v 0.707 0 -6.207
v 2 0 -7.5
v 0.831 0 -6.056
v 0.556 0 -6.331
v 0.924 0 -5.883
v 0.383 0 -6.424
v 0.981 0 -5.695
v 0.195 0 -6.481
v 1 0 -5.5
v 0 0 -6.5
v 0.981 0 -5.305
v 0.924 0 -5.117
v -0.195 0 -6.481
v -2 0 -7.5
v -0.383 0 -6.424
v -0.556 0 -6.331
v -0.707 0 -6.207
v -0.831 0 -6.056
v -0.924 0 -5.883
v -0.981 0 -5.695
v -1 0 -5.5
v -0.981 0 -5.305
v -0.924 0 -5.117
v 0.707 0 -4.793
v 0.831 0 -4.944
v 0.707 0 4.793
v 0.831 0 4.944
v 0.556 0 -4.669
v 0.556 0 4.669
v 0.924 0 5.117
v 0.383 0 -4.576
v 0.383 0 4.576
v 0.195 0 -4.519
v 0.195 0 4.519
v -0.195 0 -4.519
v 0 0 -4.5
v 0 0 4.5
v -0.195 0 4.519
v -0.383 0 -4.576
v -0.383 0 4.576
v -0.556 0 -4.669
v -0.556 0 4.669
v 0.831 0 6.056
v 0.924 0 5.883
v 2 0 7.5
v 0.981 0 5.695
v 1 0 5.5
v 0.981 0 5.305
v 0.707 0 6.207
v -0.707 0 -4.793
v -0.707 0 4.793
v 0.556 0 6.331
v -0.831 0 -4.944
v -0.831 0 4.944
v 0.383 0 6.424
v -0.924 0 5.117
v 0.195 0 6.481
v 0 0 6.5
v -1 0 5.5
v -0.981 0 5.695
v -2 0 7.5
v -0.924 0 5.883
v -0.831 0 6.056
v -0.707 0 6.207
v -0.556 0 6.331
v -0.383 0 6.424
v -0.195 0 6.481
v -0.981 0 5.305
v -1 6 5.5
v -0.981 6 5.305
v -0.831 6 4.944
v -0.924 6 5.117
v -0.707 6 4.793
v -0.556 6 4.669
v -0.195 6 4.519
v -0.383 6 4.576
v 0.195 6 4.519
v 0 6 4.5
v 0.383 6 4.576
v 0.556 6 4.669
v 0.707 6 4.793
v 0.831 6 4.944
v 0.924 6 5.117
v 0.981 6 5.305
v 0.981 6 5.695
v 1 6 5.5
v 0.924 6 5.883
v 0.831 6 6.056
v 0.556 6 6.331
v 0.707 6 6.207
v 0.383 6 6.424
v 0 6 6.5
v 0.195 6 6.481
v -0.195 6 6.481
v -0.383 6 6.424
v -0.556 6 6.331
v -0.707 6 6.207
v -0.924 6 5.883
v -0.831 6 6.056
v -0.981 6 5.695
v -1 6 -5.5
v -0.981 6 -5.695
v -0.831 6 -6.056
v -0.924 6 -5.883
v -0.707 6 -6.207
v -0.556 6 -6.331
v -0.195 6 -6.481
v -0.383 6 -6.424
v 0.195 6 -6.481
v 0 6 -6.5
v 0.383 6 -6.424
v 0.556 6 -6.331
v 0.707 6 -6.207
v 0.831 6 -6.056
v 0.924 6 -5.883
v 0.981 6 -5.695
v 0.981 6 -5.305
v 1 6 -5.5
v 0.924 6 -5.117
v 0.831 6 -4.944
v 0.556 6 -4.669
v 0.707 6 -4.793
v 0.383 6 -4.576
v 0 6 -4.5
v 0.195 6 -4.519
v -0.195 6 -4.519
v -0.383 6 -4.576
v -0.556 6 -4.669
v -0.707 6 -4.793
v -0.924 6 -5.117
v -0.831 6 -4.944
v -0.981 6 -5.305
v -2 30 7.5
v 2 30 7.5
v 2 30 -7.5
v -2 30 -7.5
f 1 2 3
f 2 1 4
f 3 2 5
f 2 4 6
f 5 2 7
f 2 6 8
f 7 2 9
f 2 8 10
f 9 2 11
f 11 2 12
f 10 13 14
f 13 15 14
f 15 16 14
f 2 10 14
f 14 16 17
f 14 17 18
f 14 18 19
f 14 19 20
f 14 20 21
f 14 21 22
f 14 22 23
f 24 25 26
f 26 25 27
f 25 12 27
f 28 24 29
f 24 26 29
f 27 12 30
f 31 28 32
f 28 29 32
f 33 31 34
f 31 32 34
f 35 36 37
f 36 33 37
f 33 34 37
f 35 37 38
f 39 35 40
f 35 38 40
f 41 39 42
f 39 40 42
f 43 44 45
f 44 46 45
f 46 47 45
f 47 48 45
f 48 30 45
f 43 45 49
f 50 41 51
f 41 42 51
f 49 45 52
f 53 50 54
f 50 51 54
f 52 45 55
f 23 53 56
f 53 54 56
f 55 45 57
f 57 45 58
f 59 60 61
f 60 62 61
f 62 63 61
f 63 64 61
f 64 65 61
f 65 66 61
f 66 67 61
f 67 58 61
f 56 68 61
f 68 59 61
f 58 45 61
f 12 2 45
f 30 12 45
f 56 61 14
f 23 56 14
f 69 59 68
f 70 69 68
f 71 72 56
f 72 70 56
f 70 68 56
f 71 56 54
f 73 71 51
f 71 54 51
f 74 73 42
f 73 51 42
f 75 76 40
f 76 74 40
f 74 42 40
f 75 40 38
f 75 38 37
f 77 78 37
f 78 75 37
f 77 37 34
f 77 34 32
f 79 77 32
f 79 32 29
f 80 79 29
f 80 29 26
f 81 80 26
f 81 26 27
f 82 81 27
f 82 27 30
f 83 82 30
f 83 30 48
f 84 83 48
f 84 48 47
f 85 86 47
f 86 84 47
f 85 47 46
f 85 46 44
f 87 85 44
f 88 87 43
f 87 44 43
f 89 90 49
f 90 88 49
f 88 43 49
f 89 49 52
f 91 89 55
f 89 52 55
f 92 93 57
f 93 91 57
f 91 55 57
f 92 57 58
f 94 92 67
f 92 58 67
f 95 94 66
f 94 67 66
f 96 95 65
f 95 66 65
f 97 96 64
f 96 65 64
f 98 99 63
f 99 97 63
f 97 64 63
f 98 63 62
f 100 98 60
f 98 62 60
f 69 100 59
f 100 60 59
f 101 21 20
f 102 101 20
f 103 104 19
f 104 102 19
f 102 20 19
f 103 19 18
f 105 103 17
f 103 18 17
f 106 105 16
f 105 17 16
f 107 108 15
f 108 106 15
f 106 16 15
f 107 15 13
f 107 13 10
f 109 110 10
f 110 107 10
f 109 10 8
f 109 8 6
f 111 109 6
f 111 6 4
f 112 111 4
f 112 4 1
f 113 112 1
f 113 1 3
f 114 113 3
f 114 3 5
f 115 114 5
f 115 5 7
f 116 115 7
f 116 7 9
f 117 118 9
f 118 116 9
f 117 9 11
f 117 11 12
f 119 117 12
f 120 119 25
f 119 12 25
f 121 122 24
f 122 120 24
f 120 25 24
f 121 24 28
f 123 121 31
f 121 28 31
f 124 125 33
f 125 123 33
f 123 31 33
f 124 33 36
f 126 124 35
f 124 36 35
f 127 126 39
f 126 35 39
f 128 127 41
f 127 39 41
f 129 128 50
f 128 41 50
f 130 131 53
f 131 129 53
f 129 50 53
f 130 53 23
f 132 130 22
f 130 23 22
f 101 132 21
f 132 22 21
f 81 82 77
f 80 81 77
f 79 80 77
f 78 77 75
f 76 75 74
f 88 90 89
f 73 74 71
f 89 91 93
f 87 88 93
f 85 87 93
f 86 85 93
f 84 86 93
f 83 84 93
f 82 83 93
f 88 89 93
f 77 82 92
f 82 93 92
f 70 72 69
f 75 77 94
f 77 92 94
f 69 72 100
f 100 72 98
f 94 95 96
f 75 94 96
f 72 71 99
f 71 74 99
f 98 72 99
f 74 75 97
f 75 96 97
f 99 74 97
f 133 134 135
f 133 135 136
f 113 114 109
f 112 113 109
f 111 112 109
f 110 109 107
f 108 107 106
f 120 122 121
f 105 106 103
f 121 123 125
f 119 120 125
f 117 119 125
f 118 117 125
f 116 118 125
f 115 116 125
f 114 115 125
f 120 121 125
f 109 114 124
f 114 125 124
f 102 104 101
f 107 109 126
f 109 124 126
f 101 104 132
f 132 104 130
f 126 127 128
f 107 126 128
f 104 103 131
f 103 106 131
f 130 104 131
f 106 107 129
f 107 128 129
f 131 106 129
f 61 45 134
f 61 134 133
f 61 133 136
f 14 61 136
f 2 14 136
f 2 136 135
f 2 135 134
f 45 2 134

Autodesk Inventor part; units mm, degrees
ref_plane "YZ Plane" through (0, 0, 0) normal (1, 0, 0) x (0, 1, 0)
ref_plane "XZ Plane" through (0, 0, 0) normal (0, 1, 0) x (-1, 0, 0)
ref_plane "XY Plane" through (0, 0, 0) normal (0, 0, 1) x (1, 0, 0)
sketch "スケッチ1" plane through (0, 0, 0) normal (0, 1, 0) x (-1, 0, 0)
  line L0 (-2, 7.5) -> (2, 7.5)
  line L1 (2, 7.5) -> (2, -7.5)
  line L2 (2, -7.5) -> (-2, -7.5)
  line L3 (-2, -7.5) -> (-2, 7.5)
  line L4 (-2, 7.5) -> (2, -7.5) construction
  line L5 (2, 7.5) -> (-2, -7.5) construction
  circle A0 centre (0, 5.5) radius 1
  circle A1 centre (0, -5.5) radius 1
  line L6 (0, 5.5) -> (0, 7.5) construction
  line L7 (0, -5.5) -> (0, -7.5) construction
  point P0 (0, 0)
  dimension "d0" = 4
  dimension "d1" = 15
  dimension "d2" = 2
  dimension "d3" = 2
extrude "押し出し1" add sketch "スケッチ1" along normal blind 30 contours L0 L1 L2 L3 | A0 | A1
extrude "押し出し2" cut sketch "スケッチ1" along normal blind 6 contours A0 | A1
properties part number "BallSensor_Mount"
